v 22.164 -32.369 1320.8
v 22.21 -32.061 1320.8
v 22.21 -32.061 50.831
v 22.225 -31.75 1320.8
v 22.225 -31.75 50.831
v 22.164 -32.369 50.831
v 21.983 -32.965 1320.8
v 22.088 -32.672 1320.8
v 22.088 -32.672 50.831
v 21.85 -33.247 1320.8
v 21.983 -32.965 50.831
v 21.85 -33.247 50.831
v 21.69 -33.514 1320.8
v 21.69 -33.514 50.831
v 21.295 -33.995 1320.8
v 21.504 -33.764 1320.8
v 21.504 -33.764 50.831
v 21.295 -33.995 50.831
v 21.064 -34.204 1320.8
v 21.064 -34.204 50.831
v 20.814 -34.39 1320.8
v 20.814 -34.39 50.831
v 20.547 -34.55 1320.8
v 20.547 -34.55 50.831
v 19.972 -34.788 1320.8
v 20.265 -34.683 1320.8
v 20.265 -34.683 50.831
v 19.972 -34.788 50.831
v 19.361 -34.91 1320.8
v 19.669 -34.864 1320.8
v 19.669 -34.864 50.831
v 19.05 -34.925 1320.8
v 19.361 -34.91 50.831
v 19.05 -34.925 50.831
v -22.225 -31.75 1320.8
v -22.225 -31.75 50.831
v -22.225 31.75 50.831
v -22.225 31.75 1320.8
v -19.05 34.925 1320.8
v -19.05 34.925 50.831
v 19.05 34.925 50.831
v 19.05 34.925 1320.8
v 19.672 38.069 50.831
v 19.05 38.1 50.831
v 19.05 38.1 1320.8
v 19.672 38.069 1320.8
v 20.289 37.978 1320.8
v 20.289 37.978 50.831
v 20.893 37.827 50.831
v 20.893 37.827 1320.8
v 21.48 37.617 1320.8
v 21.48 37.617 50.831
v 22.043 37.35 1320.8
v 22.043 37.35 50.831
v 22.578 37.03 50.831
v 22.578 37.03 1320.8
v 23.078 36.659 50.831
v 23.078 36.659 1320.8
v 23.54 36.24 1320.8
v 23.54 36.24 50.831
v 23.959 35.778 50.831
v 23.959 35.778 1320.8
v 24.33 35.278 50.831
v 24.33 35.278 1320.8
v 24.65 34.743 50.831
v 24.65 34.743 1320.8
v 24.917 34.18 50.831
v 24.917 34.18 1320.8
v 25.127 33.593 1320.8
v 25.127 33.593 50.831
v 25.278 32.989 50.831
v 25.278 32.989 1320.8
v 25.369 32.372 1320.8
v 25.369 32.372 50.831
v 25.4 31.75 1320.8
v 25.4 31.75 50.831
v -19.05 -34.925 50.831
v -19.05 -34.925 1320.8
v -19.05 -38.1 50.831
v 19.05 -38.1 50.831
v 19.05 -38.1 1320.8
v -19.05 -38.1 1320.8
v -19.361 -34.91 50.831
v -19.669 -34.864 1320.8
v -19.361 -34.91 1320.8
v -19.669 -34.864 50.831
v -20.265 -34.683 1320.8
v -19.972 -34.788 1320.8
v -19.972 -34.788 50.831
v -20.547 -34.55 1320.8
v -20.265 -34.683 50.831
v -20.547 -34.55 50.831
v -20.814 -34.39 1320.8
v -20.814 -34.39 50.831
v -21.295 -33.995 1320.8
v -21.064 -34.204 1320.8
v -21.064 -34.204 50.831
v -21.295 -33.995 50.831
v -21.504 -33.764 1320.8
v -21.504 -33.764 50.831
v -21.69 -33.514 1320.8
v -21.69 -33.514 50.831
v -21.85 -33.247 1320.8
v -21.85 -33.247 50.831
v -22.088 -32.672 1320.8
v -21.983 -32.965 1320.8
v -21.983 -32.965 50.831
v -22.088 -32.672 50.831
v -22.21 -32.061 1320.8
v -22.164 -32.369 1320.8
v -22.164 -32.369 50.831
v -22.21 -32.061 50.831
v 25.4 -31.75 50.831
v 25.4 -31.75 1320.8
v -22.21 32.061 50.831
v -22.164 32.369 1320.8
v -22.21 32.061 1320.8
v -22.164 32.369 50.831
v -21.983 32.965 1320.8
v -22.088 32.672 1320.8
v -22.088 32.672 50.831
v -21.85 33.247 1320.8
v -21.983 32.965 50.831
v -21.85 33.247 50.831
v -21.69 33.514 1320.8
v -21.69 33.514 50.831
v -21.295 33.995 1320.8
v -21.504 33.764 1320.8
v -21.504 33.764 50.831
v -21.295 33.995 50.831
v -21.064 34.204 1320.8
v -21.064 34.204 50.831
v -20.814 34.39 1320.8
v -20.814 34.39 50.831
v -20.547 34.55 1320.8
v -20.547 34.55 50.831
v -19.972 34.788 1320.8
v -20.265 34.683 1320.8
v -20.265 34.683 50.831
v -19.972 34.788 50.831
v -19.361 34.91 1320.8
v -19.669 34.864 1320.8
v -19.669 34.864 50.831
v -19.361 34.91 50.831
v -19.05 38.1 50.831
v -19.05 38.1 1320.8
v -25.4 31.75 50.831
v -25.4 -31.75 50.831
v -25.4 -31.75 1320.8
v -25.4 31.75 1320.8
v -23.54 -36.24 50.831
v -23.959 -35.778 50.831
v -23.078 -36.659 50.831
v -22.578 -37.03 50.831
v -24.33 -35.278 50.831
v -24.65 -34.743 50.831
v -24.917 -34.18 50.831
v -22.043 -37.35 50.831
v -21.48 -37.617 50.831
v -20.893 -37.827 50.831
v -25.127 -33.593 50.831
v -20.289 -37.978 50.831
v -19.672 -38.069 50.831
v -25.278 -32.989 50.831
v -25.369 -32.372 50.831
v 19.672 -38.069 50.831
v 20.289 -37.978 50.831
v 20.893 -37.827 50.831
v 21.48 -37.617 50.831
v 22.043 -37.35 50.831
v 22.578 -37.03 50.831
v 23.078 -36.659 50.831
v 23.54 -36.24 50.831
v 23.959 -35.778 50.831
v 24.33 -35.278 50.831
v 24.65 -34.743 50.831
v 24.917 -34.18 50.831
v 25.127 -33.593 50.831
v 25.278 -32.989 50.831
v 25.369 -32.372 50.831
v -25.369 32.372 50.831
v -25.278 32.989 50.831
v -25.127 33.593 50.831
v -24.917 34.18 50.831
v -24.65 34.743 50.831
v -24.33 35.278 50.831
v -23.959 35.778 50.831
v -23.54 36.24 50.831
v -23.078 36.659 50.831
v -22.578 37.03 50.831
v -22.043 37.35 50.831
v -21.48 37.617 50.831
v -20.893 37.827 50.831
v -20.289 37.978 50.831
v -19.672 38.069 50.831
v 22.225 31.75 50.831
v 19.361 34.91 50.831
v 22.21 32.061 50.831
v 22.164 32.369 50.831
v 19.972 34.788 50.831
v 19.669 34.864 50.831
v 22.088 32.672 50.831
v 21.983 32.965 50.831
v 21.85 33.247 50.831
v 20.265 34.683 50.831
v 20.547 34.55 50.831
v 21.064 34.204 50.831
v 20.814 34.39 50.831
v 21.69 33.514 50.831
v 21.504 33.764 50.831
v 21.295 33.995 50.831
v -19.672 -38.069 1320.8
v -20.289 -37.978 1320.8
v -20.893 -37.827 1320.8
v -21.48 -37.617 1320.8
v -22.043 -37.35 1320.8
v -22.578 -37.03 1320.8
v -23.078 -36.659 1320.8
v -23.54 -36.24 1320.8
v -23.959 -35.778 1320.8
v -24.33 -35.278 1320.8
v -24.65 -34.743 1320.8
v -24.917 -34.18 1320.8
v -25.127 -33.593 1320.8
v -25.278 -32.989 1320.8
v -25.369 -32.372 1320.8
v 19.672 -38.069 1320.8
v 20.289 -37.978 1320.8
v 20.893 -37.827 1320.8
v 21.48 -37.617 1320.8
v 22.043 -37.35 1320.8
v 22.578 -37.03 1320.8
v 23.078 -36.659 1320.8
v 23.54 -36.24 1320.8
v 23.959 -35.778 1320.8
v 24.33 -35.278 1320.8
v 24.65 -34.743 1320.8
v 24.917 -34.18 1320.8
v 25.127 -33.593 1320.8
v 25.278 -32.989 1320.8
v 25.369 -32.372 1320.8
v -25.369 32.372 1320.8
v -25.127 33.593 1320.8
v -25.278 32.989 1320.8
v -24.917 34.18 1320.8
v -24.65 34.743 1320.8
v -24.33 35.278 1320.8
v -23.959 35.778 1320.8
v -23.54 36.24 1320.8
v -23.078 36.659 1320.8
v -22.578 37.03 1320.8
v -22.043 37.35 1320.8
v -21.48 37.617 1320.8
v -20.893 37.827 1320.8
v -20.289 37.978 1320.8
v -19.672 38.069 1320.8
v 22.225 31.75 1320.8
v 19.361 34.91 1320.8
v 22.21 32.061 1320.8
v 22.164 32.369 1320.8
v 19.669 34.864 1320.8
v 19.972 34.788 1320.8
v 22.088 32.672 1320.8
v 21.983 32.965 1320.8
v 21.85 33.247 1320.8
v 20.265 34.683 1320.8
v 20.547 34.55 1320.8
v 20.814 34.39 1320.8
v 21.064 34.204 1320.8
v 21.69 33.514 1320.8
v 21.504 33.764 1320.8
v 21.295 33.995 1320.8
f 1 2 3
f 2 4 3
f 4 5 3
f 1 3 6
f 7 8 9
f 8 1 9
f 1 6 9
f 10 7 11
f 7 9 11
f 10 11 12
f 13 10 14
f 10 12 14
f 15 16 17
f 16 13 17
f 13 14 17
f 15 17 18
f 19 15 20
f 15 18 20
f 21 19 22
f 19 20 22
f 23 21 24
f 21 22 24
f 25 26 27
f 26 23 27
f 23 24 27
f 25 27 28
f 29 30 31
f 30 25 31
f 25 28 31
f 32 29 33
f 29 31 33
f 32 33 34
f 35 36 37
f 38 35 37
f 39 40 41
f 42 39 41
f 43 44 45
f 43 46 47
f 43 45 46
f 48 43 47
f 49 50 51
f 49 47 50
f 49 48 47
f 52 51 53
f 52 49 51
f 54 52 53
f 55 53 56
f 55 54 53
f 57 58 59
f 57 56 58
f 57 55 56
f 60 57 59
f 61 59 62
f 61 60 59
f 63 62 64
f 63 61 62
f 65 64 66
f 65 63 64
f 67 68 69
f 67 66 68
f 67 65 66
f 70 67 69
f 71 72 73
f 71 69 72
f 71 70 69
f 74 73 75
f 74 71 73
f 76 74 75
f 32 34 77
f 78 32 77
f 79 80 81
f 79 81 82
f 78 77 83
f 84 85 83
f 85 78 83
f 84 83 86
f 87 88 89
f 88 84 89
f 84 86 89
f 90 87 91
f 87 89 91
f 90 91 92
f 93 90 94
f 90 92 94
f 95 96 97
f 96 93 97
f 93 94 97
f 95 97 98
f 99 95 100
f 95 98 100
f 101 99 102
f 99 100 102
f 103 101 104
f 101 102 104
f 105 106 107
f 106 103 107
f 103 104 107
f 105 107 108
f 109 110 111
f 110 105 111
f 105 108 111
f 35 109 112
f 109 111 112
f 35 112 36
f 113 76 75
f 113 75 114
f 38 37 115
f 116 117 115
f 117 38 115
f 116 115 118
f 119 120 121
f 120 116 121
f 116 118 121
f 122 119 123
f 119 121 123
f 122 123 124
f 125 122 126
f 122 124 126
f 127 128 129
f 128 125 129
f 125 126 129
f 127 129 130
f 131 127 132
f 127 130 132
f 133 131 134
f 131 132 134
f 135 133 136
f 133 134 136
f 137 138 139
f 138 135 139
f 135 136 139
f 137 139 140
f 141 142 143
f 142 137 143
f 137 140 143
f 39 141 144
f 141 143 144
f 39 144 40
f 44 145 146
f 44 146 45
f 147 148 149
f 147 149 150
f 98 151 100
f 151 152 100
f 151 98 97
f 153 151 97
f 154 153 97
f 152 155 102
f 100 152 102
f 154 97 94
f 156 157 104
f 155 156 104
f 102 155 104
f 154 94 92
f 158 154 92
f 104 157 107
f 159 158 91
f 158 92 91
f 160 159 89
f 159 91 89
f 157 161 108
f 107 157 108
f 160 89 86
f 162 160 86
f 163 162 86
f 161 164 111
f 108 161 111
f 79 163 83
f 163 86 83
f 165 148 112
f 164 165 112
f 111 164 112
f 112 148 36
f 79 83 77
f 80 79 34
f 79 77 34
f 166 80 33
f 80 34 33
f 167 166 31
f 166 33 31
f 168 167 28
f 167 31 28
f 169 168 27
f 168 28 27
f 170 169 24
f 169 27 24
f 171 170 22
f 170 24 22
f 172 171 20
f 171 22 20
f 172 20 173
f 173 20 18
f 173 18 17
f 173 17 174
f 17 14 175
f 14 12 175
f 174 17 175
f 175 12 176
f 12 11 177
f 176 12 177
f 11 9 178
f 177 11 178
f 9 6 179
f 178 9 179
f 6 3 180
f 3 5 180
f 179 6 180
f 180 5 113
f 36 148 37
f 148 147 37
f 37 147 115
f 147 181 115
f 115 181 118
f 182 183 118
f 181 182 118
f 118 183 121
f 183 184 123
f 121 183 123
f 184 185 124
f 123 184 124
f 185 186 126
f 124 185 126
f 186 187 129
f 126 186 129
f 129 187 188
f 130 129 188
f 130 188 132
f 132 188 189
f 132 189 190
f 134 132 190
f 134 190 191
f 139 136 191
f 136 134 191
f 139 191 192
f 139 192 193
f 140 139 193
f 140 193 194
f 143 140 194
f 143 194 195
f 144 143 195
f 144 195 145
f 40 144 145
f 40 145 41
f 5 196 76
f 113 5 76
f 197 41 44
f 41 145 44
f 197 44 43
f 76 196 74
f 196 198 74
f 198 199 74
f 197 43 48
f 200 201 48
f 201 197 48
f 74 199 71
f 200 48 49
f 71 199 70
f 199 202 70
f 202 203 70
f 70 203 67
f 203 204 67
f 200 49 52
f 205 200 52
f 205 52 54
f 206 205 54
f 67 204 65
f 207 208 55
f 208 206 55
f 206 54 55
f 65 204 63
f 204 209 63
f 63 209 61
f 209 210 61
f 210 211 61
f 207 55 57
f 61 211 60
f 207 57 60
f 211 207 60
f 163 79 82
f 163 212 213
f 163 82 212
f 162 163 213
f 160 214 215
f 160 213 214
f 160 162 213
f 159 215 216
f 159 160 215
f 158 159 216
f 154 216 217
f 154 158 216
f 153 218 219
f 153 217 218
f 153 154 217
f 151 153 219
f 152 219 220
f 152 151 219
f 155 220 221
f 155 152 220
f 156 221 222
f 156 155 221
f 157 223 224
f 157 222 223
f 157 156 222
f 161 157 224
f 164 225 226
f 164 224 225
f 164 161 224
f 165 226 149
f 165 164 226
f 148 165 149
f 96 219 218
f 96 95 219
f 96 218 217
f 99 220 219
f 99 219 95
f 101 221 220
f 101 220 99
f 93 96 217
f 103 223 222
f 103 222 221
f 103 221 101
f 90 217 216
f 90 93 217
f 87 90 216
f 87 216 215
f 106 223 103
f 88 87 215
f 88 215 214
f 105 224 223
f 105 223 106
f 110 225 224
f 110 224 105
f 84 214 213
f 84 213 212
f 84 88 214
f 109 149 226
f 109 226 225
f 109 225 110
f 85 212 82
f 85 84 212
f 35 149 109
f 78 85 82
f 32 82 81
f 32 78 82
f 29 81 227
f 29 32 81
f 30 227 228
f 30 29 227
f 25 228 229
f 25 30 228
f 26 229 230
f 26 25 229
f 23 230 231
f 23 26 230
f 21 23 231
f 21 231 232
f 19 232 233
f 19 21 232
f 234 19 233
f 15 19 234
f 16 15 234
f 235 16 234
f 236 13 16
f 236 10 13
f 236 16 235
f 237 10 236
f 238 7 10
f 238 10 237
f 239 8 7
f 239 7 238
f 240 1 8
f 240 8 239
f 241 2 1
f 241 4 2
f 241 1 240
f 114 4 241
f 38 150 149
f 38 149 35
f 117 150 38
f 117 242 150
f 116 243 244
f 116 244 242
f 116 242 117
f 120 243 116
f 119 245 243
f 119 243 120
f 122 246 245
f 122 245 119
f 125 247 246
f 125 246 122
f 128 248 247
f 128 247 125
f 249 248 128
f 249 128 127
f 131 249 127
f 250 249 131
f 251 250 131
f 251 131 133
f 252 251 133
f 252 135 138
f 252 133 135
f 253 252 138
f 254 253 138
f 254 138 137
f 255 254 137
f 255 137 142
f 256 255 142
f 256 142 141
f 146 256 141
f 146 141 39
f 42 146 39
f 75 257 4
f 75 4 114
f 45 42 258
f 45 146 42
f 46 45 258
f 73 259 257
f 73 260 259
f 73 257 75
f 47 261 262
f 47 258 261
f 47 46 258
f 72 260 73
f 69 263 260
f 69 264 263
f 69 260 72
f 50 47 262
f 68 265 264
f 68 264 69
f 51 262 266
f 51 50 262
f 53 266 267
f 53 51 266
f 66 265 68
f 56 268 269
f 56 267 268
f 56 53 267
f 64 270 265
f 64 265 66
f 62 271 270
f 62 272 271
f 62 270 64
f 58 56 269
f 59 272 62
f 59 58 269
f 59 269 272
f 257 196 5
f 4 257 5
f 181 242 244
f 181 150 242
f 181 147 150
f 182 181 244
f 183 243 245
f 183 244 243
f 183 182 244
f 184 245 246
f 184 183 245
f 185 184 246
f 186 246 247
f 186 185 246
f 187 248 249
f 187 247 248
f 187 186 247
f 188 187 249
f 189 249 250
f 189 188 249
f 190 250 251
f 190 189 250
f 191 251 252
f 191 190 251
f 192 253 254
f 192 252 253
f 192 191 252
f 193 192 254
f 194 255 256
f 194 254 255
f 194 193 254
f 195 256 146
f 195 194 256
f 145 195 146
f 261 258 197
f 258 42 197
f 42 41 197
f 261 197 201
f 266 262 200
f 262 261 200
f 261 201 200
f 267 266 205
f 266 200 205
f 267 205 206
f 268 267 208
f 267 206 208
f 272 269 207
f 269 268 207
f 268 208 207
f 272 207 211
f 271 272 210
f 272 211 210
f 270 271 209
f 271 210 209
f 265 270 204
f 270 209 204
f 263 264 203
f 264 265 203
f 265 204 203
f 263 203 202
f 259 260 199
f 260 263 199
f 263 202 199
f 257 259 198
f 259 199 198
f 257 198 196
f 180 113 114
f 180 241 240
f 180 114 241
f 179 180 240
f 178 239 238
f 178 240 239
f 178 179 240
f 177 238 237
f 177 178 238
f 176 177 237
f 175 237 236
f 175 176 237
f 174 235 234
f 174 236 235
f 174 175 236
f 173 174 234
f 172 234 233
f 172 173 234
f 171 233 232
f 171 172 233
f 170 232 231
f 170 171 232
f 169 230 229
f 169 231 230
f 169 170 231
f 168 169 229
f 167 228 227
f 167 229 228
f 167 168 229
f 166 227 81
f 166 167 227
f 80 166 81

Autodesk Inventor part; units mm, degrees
ref_plane "Start Plane" through (0, 0, 50.831) normal (0, 0, 1) x (1, 0, 0)
ref_plane "End Plane" through (0, 0, 1320.8) normal (0, 0, 1) x (1, 0, 0)
sketch "Sketch" plane through (0, 0, 0) normal (0, 0, 1) x (1, 0, 0)
  line L0 (-25.4, -31.75) -> (-25.4, 31.75)
  line L1 (-19.05, 38.1) -> (19.05, 38.1)
  line L2 (25.4, 31.75) -> (25.4, -31.75)
  line L3 (19.05, -38.1) -> (-19.05, -38.1)
  arc A0 (-25.4, -31.75) -> (-19.05, -38.1) centre (-19.05, -31.75) ccw
  arc A1 (-19.05, 38.1) -> (-25.4, 31.75) centre (-19.05, 31.75) ccw
  arc A2 (25.4, 31.75) -> (19.05, 38.1) centre (19.05, 31.75) ccw
  arc A3 (19.05, -38.1) -> (25.4, -31.75) centre (19.05, -31.75) ccw
  arc A4 (-19.05, 34.925) -> (-22.225, 31.75) centre (-19.05, 31.75) ccw
  line L4 (-19.05, 34.925) -> (19.05, 34.925)
  arc A5 (22.225, 31.75) -> (19.05, 34.925) centre (19.05, 31.75) ccw
  line L5 (22.225, 31.75) -> (22.225, -31.75)
  arc A6 (19.05, -34.925) -> (22.225, -31.75) centre (19.05, -31.75) ccw
  line L6 (19.05, -34.925) -> (-19.05, -34.925)
  arc A7 (-22.225, -31.75) -> (-19.05, -34.925) centre (-19.05, -31.75) ccw
  line L7 (-22.225, -31.75) -> (-22.225, 31.75)
  line L8 (0, 55.1812) -> (0, -55.1812) construction
  line L9 (-37.4012, 0) -> (37.4012, 0) construction
  dimension "d10" = 76.2
  dimension "d11" = 50.8
  dimension "d12" = 3.175
  dimension "d15" = 38.1
  dimension "d16" = 25.4
  dimension "d17" = 6.35
extrude "Body" add sketch "Sketch" along normal up to surface (1269.969 mm away) from surface at 50.831
sketch "Sketch3" plane through (0, 0, 0) normal (0, 0, 1) x (1, 0, 0)
  line L0 (0, 0) -> (10, 0)
ref_plane "Work Plane3" through (0, 0, 0) normal (0, -1, 0) x (1, 0, 0)
ref_plane "Work Plane4" through (-2540, 0, 50.831) normal (0, 0, -1) x (-1, 0, 0)
split "Split1" plane through (-2540, 0, 50.831) removes the side toward (0, 0, -1)
sketch "Sketch4" plane through (0, 0, 0) normal (0, -1, 0) x (1, 0, 0)
  line L0 (-2, 50.831) -> (12, 50.831) projected
  line L1 (-2, 1320.8) -> (12, 1320.8) projected
  dimension "d19" = 1269.969
equation "\"d10\" = G_H"
equation "\"d11\" = G_W"
equation "\"d12\" = G_T"
equation "\"d15\" = 0.5 * d10"
equation "\"d16\" = 0.5 * d11"
equation "\"d17\" = G_IR"
equation "\"d3\" = G_L"
equation "\"G_W\" = 50.8"
equation "\"G_H\" = 76.2"
equation "\"G_T\" = 3.175"
equation "\"G_IR\" = 6.35"
equation "\"G_L\" = d19"
equation "\"G_OFFSET_START\" = -50.831"
equation "\"G_OFFSET_END\" = 0"
equation "\"d13\" = -G_OFFSET_START"
equation "\"d14\" = G_OFFSET_END + B_L"
equation "\"B_L\" = 1320.8"
properties part number "AISC - 3 x 2 x 1/8 - 49.999" material "Steel, Mild"
